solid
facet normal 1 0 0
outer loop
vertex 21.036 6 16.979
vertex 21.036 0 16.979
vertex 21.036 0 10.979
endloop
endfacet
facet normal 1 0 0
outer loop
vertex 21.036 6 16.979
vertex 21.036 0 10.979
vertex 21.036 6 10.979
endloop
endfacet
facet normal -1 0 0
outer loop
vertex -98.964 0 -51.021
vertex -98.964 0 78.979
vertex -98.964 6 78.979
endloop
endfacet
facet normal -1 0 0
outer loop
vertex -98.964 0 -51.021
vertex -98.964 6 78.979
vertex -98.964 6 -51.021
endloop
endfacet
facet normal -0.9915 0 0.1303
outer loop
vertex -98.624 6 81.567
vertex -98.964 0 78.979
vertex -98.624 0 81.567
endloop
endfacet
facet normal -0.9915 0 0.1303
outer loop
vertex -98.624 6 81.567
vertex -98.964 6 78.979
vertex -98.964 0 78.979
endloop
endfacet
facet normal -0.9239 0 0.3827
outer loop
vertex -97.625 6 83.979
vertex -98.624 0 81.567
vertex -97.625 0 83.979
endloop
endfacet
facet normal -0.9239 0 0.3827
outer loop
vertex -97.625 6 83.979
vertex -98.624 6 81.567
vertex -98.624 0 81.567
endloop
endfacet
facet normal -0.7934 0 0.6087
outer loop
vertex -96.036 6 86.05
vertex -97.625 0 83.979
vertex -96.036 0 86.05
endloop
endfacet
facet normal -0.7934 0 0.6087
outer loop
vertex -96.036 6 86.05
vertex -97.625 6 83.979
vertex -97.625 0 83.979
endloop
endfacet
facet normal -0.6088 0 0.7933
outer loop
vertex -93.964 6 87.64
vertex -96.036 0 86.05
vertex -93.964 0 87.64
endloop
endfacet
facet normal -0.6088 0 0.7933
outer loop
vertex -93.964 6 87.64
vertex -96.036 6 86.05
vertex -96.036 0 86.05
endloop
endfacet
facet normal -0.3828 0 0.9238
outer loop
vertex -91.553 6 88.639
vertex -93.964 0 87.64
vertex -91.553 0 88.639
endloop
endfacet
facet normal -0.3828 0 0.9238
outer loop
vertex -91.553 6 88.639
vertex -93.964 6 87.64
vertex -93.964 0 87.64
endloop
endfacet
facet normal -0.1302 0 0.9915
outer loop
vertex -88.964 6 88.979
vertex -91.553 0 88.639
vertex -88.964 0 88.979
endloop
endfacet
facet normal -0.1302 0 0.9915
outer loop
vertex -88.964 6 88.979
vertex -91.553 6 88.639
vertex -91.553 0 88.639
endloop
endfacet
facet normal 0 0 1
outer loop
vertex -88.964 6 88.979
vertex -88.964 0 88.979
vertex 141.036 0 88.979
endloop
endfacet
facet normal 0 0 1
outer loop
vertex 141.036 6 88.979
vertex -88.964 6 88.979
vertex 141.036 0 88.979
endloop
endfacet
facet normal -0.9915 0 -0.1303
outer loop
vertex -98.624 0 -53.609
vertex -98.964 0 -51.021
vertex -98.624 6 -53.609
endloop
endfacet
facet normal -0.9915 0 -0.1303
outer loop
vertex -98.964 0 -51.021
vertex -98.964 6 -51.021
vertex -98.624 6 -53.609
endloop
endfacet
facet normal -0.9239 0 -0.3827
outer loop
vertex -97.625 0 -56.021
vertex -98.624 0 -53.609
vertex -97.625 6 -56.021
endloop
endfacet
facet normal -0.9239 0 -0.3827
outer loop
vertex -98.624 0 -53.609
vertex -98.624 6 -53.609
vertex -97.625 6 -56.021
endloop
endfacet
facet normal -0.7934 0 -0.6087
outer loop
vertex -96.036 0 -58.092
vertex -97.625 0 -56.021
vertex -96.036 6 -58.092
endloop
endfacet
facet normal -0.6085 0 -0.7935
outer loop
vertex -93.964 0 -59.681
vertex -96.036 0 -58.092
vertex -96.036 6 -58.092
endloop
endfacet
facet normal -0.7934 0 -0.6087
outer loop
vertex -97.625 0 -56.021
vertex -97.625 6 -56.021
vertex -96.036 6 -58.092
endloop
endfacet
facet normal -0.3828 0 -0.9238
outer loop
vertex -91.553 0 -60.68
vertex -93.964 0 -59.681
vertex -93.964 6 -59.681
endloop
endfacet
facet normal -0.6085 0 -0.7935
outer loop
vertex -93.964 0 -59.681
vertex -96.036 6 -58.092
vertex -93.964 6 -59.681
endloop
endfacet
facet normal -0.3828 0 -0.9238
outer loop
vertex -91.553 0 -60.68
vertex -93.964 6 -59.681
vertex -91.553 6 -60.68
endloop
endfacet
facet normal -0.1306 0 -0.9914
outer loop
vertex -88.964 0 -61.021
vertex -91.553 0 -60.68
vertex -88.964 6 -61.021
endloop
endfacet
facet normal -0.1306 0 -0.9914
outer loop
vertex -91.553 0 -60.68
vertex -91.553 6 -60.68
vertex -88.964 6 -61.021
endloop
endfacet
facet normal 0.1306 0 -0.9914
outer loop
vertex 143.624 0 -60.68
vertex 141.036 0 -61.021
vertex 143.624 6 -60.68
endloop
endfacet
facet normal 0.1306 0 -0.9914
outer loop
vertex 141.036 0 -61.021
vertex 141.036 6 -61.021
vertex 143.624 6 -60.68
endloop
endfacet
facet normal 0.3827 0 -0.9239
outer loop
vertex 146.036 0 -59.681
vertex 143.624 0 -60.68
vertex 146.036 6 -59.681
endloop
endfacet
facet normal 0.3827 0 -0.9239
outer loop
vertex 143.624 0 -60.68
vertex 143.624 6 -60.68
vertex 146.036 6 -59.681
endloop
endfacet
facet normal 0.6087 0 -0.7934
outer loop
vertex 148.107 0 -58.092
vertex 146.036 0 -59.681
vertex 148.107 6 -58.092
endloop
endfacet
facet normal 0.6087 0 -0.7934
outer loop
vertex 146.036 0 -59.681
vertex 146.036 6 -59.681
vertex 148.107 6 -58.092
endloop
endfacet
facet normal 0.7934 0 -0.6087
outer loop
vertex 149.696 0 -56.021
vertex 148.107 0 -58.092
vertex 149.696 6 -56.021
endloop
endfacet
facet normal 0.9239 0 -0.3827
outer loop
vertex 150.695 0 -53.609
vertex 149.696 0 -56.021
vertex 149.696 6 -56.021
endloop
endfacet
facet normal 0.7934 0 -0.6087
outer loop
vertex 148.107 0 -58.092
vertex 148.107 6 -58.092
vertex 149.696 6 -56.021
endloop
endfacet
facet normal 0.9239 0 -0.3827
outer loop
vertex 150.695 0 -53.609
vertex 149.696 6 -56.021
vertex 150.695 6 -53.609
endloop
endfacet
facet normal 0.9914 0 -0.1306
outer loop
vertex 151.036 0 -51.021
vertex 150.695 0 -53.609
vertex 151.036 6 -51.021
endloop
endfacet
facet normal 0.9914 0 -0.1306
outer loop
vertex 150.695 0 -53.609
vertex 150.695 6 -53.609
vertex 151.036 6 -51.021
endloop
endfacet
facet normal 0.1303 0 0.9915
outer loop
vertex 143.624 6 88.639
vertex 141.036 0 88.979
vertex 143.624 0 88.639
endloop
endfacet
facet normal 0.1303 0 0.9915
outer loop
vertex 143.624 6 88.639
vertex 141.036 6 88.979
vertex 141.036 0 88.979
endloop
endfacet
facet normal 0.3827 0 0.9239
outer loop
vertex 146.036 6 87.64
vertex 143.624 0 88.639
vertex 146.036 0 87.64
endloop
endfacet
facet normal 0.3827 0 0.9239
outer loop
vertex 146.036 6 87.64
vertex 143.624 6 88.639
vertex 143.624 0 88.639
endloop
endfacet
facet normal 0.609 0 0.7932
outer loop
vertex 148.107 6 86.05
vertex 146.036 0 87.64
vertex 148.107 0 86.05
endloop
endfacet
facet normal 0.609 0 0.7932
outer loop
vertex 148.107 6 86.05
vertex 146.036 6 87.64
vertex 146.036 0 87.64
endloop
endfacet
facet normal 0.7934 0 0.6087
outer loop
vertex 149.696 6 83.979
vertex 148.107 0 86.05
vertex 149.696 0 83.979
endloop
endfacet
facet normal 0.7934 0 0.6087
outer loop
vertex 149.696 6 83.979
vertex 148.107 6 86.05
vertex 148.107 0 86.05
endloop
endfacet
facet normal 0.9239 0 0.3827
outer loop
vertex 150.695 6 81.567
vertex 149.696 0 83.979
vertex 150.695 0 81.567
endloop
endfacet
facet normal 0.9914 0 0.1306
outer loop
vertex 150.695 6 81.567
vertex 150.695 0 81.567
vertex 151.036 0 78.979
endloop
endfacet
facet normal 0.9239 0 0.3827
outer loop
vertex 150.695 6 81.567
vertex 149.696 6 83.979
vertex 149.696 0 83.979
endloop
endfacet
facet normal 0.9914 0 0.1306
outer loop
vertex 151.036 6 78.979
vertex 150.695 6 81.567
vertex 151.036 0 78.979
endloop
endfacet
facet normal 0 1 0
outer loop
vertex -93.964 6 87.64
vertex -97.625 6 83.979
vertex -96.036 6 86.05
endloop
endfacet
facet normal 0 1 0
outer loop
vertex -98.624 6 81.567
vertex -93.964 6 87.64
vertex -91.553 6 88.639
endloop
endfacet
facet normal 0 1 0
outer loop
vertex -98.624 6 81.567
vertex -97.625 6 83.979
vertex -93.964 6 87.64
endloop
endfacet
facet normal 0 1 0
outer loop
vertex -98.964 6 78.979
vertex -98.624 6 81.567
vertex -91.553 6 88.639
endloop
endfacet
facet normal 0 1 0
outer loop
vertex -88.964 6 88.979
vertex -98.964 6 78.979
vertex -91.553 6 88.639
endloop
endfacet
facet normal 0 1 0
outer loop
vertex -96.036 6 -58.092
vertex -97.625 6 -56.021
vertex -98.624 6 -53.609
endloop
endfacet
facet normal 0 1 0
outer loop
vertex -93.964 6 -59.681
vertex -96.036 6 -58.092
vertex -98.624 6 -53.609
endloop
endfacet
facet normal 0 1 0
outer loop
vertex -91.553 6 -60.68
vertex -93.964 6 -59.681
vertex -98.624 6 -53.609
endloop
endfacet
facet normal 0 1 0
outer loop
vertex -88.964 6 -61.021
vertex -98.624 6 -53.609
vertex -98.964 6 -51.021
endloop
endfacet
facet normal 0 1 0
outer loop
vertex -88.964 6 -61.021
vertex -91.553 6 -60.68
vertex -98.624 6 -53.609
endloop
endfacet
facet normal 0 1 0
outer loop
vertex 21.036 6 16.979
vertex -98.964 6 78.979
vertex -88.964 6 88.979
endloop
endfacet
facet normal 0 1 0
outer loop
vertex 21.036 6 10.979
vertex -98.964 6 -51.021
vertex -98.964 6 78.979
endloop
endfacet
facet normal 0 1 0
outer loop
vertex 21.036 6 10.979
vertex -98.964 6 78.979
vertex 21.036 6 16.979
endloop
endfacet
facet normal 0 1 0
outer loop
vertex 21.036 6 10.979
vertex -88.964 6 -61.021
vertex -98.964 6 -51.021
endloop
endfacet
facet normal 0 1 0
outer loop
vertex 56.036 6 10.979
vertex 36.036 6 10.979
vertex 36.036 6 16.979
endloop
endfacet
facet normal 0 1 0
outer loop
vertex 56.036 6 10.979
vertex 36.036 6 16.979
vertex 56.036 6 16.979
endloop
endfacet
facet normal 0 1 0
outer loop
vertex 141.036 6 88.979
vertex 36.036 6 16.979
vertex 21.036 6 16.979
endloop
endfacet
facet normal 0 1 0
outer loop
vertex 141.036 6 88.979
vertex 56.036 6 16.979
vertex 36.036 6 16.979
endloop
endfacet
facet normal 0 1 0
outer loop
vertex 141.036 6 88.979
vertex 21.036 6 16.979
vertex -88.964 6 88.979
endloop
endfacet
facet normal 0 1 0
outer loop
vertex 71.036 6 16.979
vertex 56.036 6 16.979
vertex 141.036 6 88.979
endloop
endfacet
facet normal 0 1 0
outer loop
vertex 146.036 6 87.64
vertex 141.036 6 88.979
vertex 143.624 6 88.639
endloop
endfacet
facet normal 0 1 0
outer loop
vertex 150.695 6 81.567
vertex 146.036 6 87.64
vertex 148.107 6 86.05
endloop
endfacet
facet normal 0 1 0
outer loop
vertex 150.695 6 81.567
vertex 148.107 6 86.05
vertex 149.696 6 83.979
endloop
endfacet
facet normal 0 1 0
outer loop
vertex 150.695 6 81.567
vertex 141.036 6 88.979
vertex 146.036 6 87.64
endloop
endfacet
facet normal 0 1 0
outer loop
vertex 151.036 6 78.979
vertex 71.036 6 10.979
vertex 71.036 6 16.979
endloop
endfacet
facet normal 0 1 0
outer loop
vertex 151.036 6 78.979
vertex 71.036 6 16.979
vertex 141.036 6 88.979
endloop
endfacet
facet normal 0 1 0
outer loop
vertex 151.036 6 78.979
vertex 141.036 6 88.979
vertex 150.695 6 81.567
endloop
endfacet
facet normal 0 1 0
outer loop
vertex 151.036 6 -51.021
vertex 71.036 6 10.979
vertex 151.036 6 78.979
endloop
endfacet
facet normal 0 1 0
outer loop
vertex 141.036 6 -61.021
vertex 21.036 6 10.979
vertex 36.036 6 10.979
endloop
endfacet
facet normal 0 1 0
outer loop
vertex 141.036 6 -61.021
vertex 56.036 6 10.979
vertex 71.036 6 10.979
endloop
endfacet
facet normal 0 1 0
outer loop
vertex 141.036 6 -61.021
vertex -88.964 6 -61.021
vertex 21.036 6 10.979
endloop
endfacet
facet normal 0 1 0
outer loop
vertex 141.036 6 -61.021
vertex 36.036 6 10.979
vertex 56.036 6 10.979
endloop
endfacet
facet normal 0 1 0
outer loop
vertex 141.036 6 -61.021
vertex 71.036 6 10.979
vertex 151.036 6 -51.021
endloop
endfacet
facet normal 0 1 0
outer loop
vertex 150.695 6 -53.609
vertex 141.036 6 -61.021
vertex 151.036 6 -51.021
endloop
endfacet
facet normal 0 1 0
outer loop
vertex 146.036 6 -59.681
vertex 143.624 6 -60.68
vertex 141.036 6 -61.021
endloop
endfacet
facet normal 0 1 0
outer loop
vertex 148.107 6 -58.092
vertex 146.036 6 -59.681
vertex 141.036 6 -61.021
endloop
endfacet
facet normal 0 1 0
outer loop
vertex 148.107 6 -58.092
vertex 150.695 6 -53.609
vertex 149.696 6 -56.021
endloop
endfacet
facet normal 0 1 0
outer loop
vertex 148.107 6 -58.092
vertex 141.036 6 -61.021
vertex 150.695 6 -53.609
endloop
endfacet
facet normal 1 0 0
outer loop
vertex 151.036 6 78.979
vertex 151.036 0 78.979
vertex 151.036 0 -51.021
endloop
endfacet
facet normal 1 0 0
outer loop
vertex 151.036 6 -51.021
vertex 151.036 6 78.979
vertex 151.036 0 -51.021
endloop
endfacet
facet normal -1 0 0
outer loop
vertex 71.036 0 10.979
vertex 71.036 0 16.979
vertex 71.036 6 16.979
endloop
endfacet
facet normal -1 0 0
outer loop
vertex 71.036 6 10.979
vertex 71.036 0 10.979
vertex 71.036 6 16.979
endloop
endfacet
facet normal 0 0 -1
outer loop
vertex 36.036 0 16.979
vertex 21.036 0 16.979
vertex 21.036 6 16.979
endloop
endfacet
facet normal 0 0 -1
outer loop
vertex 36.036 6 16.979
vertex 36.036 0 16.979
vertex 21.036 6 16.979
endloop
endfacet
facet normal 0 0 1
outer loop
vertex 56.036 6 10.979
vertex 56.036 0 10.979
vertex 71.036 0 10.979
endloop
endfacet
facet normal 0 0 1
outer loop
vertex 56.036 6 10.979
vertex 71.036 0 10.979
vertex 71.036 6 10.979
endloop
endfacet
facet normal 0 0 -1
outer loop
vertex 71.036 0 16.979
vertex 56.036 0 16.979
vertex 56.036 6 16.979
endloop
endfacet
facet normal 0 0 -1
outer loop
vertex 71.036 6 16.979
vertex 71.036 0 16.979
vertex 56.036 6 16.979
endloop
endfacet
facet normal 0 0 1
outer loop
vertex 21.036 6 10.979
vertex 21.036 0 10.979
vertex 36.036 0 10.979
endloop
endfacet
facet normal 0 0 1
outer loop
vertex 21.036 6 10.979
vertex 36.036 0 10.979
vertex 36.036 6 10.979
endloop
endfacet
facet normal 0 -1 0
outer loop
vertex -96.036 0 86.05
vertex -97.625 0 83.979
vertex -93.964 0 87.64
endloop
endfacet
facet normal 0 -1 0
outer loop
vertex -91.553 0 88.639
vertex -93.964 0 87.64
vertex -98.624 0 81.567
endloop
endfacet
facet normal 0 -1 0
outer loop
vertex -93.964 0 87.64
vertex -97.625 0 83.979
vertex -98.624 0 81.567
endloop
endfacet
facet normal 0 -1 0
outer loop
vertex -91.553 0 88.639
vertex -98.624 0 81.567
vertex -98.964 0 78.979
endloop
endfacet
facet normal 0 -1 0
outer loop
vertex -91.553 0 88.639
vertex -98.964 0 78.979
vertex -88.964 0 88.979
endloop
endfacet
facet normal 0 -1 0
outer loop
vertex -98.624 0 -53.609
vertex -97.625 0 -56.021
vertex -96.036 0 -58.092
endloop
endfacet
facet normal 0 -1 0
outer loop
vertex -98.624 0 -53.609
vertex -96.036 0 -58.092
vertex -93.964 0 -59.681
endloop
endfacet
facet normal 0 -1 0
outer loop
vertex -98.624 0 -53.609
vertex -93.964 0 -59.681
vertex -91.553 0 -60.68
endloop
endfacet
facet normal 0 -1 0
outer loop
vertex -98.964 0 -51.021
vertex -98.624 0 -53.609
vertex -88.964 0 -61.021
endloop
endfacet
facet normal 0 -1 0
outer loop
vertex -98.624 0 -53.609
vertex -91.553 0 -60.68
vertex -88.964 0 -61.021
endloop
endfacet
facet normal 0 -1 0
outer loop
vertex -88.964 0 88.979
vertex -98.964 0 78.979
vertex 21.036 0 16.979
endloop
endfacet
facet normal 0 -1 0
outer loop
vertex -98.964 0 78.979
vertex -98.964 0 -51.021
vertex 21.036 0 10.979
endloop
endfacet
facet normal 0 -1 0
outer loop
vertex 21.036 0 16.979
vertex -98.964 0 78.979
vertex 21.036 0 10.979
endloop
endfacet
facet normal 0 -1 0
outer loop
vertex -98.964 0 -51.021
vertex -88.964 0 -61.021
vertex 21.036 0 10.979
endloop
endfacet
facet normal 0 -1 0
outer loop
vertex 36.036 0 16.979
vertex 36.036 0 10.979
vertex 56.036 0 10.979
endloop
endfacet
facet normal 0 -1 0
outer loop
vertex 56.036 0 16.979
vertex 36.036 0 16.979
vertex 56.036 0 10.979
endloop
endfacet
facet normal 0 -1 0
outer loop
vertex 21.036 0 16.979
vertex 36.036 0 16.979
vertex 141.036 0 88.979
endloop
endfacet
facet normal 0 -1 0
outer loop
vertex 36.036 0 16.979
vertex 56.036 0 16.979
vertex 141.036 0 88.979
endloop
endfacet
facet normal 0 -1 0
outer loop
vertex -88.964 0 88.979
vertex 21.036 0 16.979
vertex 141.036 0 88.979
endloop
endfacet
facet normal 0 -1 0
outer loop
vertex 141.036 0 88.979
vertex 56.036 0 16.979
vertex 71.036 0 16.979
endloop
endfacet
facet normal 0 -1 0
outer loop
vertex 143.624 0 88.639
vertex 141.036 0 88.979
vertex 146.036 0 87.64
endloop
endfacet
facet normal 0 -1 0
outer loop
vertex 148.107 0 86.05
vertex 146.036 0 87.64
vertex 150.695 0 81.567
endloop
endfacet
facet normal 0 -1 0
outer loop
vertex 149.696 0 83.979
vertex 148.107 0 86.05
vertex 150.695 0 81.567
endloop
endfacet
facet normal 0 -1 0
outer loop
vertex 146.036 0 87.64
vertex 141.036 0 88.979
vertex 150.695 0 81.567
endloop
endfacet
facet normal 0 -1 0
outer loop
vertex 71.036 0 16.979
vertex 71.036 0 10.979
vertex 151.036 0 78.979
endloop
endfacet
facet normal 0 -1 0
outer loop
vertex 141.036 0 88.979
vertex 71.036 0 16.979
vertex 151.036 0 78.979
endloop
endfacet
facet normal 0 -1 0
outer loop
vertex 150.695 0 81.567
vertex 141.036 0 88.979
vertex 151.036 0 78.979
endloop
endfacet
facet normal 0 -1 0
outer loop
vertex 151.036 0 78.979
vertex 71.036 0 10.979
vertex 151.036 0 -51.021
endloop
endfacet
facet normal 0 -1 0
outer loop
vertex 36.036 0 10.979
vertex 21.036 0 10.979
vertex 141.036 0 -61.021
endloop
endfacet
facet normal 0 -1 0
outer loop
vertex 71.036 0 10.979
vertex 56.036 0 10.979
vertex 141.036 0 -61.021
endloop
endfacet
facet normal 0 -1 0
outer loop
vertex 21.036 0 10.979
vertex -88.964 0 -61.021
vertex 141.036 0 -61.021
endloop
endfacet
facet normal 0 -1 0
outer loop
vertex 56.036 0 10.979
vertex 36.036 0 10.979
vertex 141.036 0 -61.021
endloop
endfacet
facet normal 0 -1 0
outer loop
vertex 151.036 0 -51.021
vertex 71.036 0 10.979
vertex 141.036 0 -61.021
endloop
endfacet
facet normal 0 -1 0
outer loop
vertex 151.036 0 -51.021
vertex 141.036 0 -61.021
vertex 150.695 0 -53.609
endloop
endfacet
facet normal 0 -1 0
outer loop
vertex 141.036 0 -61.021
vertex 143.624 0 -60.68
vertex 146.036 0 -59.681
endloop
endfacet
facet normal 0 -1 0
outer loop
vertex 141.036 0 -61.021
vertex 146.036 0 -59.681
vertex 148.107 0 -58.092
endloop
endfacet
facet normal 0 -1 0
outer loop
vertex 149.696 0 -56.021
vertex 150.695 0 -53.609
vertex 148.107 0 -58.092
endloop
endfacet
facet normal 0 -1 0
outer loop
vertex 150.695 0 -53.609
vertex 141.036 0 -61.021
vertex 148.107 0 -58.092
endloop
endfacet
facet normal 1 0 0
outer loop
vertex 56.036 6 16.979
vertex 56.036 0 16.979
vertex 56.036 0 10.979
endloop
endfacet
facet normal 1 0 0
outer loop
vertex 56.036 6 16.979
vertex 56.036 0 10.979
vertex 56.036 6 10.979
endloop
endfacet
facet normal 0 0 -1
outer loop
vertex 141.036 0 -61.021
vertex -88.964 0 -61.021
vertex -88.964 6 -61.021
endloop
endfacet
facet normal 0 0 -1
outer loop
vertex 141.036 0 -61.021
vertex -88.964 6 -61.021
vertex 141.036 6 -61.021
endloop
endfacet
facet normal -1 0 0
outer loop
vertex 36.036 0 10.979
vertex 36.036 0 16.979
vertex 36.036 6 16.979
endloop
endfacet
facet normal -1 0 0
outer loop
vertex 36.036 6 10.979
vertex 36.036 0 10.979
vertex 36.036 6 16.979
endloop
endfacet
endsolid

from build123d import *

# Parameters (mm, degrees)
ESQUISSE1_W            = 250
ESQUISSE1_H            = 150
BOSS_EXTRU_1_DEPTH     = 6
EMPREINTE1_START       = 21.035502959
EMPREINTE1_OUTLINE_W   = 6
EMPREINTE1_OUTLINE_H   = 6
EMPREINTE1_DEPTH       = 15
EMPREINTE1_START_2     = 56.035502959
EMPREINTE1_2_OUTLINE_W = 6
EMPREINTE1_2_OUTLINE_H = 6
EMPREINTE1_2_DEPTH     = 15
CONG_1_R               = 10


# Read off the part's stored shape, not the designer's step: Empreinte1
with BuildPart() as part:
    # Esquisse1 → Boss.-Extru.1 (new body)
    with BuildSketch(Plane(origin=(0, 0, 0), x_dir=(1, 0, 0), z_dir=(0, 1, 0))):
        with Locations((26.035502959, -13.979289941)):
            Rectangle(ESQUISSE1_W, ESQUISSE1_H)
    extrude(amount=BOSS_EXTRU_1_DEPTH)

    # Empreinte1 outline → Empreinte1 (cut)
    with BuildSketch(Plane.YZ.offset(EMPREINTE1_START)):
        with Locations((3, 13.979289941)):
            Rectangle(EMPREINTE1_OUTLINE_W, EMPREINTE1_OUTLINE_H)
    extrude(amount=EMPREINTE1_DEPTH, mode=Mode.SUBTRACT)

    # Empreinte1 2 outline → Empreinte1 2 (cut)
    with BuildSketch(Plane.YZ.offset(EMPREINTE1_START_2)):
        with Locations((3, 13.979289941)):
            Rectangle(EMPREINTE1_2_OUTLINE_W, EMPREINTE1_2_OUTLINE_H)
    extrude(amount=EMPREINTE1_2_DEPTH, mode=Mode.SUBTRACT)

    # Congé1
    cong_1_edges = [part.edges().sort_by_distance(p)[0] for p in [
        (-98.964497041, 3, -61.020710059),
        (151.035502959, 3, -61.020710059),
        (151.035502959, 3, 88.979289941),
        (-98.964497041, 3, 88.979289941),
    ]]
    fillet(cong_1_edges, radius=CONG_1_R)


solid = part.part
